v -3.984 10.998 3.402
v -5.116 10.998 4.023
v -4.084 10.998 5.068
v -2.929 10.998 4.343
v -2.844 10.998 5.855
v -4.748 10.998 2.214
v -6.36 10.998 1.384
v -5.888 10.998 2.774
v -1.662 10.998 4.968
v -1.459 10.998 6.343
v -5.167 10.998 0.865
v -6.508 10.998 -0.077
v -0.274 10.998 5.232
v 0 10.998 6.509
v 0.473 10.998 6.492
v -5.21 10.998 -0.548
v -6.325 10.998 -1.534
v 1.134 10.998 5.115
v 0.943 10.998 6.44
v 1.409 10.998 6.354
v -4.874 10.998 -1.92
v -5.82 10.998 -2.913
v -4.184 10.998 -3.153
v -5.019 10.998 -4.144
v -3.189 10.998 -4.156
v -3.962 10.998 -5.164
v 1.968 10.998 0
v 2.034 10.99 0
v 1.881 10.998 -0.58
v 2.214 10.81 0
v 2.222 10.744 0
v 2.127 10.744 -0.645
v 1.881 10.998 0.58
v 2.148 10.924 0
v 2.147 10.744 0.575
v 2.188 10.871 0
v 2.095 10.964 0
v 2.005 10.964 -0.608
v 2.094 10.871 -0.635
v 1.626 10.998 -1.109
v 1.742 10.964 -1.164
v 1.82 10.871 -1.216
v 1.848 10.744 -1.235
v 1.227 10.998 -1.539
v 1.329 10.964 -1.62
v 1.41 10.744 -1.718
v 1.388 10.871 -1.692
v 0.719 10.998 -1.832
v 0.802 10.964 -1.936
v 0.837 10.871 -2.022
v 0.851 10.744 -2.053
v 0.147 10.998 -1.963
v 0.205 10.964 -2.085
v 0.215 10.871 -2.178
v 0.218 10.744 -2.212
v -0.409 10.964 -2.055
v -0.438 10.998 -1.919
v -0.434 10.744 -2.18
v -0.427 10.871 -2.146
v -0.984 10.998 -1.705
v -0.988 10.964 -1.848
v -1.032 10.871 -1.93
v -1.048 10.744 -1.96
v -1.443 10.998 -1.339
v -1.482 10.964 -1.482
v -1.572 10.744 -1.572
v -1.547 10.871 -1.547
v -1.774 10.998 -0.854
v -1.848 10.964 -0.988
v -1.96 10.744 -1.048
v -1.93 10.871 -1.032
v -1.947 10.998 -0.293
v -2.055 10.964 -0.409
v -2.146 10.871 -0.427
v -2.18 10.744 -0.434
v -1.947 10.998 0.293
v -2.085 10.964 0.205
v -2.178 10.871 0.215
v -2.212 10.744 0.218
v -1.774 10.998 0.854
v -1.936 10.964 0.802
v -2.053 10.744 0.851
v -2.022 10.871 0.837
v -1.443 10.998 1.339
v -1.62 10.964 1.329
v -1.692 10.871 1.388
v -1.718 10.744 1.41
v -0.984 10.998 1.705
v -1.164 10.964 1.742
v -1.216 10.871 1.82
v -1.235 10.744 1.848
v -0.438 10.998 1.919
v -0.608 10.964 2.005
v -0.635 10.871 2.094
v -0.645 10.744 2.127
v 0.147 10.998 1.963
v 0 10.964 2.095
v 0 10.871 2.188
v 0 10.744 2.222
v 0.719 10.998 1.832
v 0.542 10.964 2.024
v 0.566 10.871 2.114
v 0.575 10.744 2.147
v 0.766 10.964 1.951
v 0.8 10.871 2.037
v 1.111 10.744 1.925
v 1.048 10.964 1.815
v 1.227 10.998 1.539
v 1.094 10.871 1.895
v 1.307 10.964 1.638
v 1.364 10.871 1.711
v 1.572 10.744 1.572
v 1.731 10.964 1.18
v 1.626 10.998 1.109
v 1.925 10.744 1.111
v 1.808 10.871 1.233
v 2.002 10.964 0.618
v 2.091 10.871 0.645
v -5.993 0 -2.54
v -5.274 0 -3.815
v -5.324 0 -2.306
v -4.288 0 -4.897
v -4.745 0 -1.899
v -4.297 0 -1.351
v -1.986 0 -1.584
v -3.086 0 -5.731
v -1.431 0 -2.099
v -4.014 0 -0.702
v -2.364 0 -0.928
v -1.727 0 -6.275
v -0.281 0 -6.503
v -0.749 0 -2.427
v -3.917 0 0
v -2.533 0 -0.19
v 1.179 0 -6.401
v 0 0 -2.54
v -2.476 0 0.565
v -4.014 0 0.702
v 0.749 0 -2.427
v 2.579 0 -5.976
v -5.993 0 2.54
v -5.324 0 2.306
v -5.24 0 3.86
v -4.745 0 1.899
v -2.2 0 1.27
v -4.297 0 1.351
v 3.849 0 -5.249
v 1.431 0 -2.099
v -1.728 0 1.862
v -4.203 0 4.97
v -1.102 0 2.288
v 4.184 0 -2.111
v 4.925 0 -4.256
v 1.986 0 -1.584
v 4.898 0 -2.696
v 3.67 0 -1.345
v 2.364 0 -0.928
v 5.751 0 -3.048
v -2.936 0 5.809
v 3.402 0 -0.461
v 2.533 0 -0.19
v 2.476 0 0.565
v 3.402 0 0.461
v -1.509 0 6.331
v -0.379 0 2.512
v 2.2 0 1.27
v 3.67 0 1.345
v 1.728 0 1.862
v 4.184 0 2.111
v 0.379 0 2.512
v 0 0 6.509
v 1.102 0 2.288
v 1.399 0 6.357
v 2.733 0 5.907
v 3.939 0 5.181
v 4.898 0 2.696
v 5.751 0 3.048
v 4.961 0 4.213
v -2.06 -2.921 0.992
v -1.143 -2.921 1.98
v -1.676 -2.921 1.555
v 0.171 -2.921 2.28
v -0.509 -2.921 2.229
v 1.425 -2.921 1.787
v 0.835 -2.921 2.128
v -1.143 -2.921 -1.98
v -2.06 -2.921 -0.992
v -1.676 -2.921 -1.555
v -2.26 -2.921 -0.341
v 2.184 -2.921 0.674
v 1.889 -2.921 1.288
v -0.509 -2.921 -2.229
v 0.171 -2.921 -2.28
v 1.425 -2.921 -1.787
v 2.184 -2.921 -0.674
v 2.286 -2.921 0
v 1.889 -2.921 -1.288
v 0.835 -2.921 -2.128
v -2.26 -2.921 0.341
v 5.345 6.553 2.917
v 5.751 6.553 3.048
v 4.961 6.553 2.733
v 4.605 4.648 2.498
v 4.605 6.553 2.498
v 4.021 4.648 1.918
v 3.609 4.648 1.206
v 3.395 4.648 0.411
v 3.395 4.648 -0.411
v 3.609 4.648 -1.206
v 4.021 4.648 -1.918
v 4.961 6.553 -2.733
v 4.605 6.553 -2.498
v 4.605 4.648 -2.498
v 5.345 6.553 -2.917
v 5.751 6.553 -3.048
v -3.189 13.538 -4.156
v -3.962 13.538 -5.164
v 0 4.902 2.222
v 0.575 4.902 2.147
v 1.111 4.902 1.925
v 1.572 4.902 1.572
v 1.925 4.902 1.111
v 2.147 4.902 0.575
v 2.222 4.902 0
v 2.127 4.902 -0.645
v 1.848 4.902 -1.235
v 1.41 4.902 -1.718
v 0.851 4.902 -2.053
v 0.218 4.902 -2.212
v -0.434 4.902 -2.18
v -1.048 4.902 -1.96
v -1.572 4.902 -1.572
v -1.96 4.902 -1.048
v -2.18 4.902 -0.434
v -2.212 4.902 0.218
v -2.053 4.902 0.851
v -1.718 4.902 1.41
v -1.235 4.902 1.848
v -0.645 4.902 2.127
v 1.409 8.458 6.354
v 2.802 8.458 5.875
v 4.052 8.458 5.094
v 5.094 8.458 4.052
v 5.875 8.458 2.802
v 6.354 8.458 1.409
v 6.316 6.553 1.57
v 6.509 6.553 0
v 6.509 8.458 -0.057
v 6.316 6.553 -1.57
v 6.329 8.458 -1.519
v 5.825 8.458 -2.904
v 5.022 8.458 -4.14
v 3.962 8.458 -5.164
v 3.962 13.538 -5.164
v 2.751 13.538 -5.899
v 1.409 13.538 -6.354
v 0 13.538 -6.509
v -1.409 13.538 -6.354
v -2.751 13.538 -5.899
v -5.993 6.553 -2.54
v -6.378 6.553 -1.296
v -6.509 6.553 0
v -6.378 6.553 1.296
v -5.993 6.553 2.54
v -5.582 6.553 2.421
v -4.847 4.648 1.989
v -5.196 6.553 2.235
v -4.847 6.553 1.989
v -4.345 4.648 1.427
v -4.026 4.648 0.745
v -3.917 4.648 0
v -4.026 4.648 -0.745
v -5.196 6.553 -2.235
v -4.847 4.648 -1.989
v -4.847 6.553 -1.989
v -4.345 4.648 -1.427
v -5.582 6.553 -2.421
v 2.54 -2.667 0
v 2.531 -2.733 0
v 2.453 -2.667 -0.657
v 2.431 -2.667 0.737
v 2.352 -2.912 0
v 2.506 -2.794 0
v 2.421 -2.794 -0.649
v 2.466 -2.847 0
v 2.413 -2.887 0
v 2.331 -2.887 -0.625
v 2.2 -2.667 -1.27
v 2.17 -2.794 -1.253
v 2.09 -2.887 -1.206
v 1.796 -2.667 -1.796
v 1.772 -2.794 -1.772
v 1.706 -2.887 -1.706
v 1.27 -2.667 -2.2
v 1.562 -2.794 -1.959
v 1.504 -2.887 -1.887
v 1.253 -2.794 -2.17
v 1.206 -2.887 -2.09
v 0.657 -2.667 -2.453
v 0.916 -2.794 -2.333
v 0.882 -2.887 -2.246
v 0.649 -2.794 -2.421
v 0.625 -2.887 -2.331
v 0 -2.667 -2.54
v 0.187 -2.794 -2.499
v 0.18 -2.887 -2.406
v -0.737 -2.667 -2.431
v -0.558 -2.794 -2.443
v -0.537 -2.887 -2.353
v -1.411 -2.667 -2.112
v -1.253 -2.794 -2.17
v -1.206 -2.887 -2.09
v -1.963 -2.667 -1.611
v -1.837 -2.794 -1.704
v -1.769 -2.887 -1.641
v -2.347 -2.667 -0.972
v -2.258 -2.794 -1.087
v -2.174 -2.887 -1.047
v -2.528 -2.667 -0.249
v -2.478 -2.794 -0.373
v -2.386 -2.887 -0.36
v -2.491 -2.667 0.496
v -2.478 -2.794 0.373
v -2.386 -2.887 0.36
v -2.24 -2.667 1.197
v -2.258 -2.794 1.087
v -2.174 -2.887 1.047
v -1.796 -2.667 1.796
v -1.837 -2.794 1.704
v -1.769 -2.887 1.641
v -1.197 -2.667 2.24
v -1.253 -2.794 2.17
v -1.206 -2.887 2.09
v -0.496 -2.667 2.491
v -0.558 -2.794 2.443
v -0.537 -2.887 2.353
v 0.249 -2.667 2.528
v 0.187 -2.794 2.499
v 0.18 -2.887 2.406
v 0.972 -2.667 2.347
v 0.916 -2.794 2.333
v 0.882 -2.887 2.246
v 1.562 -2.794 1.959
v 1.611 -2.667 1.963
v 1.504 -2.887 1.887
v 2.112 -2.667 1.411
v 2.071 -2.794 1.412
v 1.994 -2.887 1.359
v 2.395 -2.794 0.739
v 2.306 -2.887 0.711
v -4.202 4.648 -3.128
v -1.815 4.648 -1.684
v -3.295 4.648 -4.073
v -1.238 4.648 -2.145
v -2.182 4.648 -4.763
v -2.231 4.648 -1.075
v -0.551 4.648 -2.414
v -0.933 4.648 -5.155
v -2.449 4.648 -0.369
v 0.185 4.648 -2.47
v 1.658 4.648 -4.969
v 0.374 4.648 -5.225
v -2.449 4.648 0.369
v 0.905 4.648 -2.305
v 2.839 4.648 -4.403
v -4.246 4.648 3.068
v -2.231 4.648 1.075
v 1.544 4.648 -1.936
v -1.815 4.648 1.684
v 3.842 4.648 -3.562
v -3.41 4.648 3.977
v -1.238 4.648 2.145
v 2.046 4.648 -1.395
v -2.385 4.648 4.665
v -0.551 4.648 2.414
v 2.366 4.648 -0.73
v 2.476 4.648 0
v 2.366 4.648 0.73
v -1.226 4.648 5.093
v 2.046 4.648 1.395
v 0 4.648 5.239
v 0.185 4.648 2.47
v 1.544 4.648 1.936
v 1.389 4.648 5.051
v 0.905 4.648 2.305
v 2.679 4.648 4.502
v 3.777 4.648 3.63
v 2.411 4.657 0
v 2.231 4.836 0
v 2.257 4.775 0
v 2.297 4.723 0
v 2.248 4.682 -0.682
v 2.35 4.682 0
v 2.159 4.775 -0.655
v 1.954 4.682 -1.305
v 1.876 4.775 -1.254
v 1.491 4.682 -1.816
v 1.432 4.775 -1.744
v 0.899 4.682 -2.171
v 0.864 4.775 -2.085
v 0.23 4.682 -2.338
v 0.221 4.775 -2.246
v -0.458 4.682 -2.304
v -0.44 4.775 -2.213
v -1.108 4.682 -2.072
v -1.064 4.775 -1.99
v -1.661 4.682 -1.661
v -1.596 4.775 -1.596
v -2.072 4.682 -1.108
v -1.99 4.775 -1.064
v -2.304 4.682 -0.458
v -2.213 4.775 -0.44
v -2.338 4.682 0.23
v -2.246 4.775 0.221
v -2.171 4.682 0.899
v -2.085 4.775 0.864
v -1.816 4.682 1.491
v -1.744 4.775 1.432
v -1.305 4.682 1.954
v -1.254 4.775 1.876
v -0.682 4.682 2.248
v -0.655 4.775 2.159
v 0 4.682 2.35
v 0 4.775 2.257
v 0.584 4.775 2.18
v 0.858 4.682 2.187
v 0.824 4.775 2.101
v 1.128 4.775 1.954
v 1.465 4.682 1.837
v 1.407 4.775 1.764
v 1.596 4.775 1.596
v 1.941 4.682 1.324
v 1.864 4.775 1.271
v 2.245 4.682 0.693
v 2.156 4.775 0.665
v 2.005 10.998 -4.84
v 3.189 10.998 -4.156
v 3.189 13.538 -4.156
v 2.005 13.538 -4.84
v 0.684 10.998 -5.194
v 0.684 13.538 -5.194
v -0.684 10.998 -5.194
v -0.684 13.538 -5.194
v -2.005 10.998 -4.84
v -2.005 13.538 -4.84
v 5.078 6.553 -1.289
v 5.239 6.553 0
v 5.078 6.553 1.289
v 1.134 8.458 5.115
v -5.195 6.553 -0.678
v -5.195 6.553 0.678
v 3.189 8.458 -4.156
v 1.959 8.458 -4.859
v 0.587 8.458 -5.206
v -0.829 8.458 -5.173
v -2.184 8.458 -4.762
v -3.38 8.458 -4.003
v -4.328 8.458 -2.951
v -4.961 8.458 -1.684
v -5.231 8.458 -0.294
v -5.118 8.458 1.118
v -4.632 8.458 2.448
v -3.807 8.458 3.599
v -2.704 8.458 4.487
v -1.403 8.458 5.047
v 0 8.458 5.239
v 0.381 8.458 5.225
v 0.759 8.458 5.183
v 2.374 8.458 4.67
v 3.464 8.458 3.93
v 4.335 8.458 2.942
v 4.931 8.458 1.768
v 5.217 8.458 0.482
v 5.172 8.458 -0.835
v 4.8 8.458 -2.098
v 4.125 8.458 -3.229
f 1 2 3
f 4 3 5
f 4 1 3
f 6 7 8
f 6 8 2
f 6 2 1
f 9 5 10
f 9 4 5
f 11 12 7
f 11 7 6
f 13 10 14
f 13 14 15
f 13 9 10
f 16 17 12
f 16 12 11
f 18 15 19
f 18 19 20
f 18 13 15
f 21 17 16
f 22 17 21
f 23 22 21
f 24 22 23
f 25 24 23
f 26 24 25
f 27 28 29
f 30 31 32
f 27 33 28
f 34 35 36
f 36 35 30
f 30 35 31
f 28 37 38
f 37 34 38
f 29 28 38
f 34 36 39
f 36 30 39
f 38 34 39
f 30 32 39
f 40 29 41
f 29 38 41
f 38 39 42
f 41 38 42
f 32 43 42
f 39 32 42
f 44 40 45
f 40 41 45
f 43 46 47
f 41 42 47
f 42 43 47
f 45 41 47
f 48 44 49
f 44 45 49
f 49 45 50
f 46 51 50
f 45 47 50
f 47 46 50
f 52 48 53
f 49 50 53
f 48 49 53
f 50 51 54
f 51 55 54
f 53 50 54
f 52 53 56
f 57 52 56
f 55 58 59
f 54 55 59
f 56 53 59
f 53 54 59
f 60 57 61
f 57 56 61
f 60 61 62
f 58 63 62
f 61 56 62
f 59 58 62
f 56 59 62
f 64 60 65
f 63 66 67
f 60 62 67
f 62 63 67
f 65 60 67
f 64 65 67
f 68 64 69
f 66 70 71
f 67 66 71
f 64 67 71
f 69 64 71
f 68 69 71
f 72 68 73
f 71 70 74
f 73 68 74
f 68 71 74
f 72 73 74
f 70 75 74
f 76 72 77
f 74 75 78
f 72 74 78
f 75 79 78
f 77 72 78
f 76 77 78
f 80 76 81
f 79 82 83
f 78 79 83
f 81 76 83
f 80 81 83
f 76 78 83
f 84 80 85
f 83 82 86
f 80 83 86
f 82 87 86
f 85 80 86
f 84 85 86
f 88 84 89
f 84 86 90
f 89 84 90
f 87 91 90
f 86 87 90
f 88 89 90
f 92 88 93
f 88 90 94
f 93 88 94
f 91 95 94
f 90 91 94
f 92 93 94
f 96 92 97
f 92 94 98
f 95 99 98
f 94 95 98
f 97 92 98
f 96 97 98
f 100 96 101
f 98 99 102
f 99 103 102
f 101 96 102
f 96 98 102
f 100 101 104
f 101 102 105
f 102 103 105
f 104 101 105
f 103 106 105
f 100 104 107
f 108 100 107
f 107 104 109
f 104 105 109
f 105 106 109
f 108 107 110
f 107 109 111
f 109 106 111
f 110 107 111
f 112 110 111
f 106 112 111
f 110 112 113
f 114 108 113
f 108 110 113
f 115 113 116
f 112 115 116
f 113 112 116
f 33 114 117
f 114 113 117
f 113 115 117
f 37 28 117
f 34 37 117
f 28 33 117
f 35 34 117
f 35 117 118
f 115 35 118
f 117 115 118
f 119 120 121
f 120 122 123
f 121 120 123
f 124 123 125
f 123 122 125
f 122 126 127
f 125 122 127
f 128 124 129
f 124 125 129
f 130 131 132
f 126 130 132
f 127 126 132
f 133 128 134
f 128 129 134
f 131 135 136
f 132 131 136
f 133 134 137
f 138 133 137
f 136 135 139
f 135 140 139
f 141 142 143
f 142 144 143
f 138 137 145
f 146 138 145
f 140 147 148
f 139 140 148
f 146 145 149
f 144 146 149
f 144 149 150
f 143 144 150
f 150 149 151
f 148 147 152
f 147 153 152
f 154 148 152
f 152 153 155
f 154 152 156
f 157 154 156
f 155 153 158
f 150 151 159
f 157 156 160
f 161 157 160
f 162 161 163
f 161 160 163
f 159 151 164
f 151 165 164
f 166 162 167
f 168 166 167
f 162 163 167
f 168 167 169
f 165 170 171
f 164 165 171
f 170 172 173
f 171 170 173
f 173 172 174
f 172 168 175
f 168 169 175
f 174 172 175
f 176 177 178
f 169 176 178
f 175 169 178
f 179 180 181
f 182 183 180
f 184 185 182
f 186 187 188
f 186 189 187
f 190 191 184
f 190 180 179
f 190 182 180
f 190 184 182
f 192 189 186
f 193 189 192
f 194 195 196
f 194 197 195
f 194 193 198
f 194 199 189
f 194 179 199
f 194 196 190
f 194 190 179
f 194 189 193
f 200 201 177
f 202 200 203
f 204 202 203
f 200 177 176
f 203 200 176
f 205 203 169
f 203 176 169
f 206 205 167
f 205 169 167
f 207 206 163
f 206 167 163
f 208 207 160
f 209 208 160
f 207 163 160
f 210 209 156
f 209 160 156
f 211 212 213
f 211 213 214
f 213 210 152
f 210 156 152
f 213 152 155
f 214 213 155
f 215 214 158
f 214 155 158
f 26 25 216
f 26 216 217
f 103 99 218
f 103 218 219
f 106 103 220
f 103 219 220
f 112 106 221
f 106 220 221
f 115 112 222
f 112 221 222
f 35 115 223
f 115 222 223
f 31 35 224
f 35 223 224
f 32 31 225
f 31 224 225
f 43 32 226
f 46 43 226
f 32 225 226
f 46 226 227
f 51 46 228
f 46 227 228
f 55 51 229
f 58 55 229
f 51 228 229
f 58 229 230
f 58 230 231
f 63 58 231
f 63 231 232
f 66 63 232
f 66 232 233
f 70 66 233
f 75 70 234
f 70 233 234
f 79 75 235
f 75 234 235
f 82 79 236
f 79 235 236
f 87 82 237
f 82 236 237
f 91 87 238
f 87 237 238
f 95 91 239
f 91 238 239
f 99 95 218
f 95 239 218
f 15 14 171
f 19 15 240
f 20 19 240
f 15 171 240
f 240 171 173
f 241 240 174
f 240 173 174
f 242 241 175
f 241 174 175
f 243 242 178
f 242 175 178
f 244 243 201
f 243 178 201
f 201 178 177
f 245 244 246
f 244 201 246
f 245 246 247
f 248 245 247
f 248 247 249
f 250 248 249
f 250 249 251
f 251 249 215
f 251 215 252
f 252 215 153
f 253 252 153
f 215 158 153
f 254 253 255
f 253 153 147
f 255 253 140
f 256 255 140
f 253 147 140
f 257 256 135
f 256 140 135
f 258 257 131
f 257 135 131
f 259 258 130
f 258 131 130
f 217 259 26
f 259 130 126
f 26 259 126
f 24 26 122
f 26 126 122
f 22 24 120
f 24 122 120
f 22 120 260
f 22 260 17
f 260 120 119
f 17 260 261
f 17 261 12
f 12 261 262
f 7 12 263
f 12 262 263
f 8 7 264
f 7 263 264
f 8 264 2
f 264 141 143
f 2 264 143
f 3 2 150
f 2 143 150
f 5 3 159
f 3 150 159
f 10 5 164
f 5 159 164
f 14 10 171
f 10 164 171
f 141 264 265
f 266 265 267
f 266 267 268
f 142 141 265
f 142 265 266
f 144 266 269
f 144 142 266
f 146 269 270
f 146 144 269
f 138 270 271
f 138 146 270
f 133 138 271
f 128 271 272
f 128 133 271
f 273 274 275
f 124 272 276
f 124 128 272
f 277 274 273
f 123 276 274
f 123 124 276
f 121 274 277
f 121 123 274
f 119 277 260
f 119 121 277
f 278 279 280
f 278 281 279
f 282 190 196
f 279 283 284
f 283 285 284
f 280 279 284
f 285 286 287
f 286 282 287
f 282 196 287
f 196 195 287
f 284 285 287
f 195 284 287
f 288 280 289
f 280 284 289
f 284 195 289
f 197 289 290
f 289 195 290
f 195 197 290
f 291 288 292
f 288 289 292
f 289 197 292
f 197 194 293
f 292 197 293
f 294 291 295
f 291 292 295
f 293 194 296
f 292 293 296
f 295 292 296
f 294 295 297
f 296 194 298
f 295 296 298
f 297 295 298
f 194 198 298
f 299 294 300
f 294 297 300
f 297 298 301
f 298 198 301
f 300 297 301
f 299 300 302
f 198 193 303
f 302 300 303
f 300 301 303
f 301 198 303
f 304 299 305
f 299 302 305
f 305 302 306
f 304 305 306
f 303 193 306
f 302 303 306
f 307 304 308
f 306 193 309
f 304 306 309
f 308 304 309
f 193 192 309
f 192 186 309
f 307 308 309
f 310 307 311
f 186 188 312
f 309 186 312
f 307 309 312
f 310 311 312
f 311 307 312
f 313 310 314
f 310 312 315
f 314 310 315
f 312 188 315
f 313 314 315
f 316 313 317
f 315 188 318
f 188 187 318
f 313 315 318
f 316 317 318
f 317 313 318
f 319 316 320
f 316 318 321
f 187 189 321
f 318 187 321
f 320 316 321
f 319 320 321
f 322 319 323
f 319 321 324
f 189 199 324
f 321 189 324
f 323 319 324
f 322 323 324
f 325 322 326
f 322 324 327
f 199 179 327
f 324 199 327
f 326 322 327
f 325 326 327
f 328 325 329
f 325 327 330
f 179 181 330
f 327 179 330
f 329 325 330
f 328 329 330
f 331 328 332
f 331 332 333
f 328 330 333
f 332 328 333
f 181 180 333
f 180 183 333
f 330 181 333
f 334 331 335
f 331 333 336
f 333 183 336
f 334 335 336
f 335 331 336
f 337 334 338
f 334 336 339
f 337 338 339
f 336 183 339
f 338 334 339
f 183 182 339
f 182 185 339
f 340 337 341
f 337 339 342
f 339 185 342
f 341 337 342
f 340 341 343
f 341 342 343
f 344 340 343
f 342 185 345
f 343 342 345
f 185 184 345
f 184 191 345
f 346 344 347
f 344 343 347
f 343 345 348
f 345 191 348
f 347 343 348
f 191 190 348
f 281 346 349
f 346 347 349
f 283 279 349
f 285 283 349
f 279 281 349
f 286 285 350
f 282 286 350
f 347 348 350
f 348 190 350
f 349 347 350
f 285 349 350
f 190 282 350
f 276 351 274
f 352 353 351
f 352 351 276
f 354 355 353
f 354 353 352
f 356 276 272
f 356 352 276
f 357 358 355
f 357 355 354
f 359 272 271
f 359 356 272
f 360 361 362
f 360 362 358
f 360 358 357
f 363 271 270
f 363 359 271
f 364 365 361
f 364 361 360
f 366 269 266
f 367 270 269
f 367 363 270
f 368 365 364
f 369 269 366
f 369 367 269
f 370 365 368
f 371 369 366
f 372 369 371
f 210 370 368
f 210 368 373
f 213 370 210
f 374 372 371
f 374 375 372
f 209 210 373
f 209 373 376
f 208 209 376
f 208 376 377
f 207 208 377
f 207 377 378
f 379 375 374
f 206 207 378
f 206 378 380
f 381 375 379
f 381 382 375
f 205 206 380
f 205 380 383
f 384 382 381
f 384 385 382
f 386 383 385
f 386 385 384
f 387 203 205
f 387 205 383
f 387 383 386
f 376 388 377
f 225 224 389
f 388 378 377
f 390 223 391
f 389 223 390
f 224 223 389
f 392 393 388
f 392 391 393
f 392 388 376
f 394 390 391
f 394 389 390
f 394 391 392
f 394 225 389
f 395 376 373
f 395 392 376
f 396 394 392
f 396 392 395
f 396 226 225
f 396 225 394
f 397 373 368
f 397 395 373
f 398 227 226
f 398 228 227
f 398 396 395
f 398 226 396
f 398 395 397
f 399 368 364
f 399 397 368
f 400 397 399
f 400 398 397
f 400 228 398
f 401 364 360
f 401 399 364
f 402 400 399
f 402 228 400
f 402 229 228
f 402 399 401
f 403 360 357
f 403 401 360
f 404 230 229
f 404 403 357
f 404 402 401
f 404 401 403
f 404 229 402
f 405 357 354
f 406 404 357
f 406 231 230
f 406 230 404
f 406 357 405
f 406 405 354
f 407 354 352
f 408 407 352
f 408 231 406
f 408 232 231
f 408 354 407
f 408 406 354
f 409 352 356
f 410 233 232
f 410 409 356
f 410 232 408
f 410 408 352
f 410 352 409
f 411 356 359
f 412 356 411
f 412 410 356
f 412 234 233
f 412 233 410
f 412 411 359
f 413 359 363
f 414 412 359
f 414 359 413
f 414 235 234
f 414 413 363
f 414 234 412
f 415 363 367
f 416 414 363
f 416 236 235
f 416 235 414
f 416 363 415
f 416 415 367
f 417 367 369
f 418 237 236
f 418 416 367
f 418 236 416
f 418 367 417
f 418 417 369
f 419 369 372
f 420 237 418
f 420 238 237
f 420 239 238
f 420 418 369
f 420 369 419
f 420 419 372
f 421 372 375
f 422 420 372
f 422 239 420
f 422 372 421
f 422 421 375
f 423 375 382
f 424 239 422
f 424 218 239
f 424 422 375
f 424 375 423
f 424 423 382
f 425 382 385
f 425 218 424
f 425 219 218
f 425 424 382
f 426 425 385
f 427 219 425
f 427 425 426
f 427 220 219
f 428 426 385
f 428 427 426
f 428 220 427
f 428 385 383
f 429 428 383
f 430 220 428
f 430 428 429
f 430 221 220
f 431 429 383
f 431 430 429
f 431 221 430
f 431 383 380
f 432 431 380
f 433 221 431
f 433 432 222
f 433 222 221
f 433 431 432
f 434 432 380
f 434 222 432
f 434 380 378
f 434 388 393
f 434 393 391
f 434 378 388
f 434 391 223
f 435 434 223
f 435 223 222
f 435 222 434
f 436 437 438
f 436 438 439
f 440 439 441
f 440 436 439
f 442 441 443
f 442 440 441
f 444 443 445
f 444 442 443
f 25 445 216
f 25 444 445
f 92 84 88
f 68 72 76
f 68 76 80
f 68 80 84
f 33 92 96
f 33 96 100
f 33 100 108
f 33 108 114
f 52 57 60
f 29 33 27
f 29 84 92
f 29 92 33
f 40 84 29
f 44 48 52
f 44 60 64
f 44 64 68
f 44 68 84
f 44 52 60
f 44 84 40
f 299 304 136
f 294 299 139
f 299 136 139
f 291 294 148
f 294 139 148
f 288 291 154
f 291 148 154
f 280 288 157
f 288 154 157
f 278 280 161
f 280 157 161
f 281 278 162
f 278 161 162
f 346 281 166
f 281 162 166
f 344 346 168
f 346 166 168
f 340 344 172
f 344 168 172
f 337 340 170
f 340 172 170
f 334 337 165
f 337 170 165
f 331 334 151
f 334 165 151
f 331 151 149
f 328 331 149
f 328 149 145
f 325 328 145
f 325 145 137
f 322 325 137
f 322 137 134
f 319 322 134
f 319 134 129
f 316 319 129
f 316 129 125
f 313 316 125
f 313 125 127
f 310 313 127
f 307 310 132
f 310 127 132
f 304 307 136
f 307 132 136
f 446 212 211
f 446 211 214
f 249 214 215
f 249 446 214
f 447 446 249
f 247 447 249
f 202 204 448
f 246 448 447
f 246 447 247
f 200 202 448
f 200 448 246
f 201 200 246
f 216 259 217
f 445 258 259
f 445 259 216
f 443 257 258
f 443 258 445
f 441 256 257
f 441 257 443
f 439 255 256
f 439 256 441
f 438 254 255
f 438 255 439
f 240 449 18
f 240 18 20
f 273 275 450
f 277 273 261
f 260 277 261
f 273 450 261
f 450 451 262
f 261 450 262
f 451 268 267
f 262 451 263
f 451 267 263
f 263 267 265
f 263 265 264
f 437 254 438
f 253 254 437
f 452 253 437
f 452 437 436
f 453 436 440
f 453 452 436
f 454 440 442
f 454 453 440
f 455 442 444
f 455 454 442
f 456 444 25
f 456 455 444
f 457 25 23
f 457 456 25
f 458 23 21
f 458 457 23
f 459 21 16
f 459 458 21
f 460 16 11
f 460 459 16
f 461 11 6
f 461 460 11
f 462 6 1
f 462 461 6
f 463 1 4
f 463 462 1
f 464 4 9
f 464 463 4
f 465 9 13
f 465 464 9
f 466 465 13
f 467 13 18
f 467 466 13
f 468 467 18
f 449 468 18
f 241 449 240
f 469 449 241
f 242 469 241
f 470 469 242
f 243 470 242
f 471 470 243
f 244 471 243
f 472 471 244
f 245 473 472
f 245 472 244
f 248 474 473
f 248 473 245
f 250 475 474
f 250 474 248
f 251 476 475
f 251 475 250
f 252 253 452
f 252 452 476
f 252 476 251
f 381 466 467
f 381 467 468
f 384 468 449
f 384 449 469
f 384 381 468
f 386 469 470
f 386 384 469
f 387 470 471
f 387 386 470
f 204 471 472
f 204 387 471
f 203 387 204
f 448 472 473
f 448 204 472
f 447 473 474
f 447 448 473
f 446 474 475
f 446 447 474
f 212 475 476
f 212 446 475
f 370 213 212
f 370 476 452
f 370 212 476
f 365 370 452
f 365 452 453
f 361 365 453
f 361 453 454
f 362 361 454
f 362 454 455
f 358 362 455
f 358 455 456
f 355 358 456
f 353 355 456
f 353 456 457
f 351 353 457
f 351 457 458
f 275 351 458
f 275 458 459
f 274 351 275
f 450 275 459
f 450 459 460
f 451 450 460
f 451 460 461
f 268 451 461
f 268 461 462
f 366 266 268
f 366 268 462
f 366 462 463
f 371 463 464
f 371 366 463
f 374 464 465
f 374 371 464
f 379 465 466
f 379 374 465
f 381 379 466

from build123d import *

# Parameters (mm, degrees)
SKETCH1_R           = 6.50875
BOSS_EXTRUDE1_DEPTH = 13.5382
SKETCH2_R           = 2.54
BOSS_EXTRUDE2_DEPTH = 2.921
CUT_EXTRUDE1_START  = -2.54
CUT_EXTRUDE1_DEPTH  = 2.54
CUT_EXTRUDE2_START  = -2.54
SKETCH4_R           = 2.2225
CUT_EXTRUDE2_DEPTH  = 2.54
CUT_EXTRUDE3_START  = -3.81
SKETCH5_R           = 5.23875
SKETCH5_R_2         = 2.2225
CUT_EXTRUDE3_DEPTH  = 3.81
CUT_EXTRUDE4_DEPTH  = 6.5532


with BuildPart() as part:
    # Sketch1 → Boss-Extrude1 (new body)
    with BuildSketch(Plane(origin=(0, 0, 0), x_dir=(1, 0, 0), z_dir=(0, 1, 0))):
        with Locations(Location((0, 0, 0), (0, 0, 270))):
            Circle(SKETCH1_R)
    extrude(amount=BOSS_EXTRUDE1_DEPTH)

    # Sketch2 → Boss-Extrude2 (add)
    with BuildSketch(Plane.XZ):
        with Locations(Location((0, 0, 0), (0, 0, 270))):
            Circle(SKETCH2_R)
    extrude(amount=BOSS_EXTRUDE2_DEPTH)

    # Sketch3 → Cut-Extrude1 (cut)
    with BuildSketch(Plane(origin=(0, 13.5382, 0), x_dir=(1, 0, 0), z_dir=(0, 1, 0)).offset(CUT_EXTRUDE1_START)):
        with BuildLine():
            Line((-3.189148936, 4.156179811), (-3.962275951, 5.163738554))
            ThreePointArc((-3.962275951, 5.163738554), (0, -6.50875), (3.962275951, 5.163738554))
            Line((3.962275951, 5.163738554), (3.189148936, 4.156179811))
            ThreePointArc((3.189148936, 4.156179811), (0, 5.23875), (-3.189148936, 4.156179811))
        make_face()
    extrude(amount=CUT_EXTRUDE1_DEPTH, mode=Mode.SUBTRACT)

    # Sketch4 → Cut-Extrude2 (cut)
    with BuildSketch(Plane(origin=(0, 10.9982, 0), x_dir=(1, 0, 0), z_dir=(0, 1, 0)).offset(CUT_EXTRUDE2_START)):
        with BuildLine():
            Line((3.962275951, 5.163738554), (3.189148936, 4.156179811))
            ThreePointArc((3.189148936, 4.156179811), (-5.114570707, 1.133873028), (1.133873028, -5.114570707))
            Line((1.133873028, -5.114570707), (1.408751337, -6.354466636))
            ThreePointArc((1.408751337, -6.354466636), (6.354466636, -1.408751337), (3.962275951, 5.163738554))
        make_face()
        with Locations(Location((0, 0, 0), (0, 0, 270))):
            Circle(SKETCH4_R, mode=Mode.SUBTRACT)
    extrude(amount=CUT_EXTRUDE2_DEPTH, mode=Mode.SUBTRACT)

    # Sketch5 → Cut-Extrude3 (cut)
    with BuildSketch(Plane(origin=(0, 8.4582, 0), x_dir=(1, 0, 0), z_dir=(0, 1, 0)).offset(CUT_EXTRUDE3_START)):
        with Locations(Location((0, 0, 0), (0, 0, 270))):
            Circle(SKETCH5_R)
        with Locations(Location((0, 0, 0), (0, 0, 270))):
            Circle(SKETCH5_R_2, mode=Mode.SUBTRACT)
    extrude(amount=CUT_EXTRUDE3_DEPTH, mode=Mode.SUBTRACT)

    # Sketch6 → Cut-Extrude4 (cut)
    with BuildSketch(Plane.XZ):
        with BuildLine():
            ThreePointArc((5.750958404, 3.048), (3.367961548, 0), (5.750958404, -3.048))
            ThreePointArc((5.750958404, -3.048), (6.50875, 0), (5.750958404, 3.048))
        make_face()
        with BuildLine():
            ThreePointArc((-5.992681083, 2.54), (-3.916853566, 0), (-5.992681083, -2.54))
            ThreePointArc((-5.992681083, -2.54), (-6.50875, 0), (-5.992681083, 2.54))
        make_face()
    extrude(amount=-CUT_EXTRUDE4_DEPTH, mode=Mode.SUBTRACT)

    # Fillet2: read off the stored shape, not the designer's step
    # Fillet2 outline → Fillet2 (revolve, cut)
    with BuildSketch(Plane.XY):
        with BuildLine():
            ThreePointArc((1.9685, 10.9982), (2.148105122, 10.923805122), (2.2225, 10.7442))
            Line((2.2225, 10.7442), (2.2225, 10.9982))
            Line((2.2225, 10.9982), (1.9685, 10.9982))
        make_face()
        with BuildLine():
            Line((2.54, -2.921), (2.54, -2.667))
            ThreePointArc((2.54, -2.667), (2.465605122, -2.846605122), (2.286, -2.921))
            Line((2.286, -2.921), (2.54, -2.921))
        make_face()
    revolve(axis=Axis((0, 0, 0), (0, 1, 0)), mode=Mode.SUBTRACT)

    # Fillet2 2 outline → Fillet2 2 (revolve)
    with BuildSketch(Plane.XY):
        with BuildLine():
            Line((2.2225, 4.9022), (2.2225, 4.6482))
            Line((2.2225, 4.6482), (2.4765, 4.6482))
            ThreePointArc((2.4765, 4.6482), (2.296894878, 4.722594878), (2.2225, 4.9022))
        make_face()
    revolve(axis=Axis((0, 0, 0), (0, 1, 0)))


solid = part.part
